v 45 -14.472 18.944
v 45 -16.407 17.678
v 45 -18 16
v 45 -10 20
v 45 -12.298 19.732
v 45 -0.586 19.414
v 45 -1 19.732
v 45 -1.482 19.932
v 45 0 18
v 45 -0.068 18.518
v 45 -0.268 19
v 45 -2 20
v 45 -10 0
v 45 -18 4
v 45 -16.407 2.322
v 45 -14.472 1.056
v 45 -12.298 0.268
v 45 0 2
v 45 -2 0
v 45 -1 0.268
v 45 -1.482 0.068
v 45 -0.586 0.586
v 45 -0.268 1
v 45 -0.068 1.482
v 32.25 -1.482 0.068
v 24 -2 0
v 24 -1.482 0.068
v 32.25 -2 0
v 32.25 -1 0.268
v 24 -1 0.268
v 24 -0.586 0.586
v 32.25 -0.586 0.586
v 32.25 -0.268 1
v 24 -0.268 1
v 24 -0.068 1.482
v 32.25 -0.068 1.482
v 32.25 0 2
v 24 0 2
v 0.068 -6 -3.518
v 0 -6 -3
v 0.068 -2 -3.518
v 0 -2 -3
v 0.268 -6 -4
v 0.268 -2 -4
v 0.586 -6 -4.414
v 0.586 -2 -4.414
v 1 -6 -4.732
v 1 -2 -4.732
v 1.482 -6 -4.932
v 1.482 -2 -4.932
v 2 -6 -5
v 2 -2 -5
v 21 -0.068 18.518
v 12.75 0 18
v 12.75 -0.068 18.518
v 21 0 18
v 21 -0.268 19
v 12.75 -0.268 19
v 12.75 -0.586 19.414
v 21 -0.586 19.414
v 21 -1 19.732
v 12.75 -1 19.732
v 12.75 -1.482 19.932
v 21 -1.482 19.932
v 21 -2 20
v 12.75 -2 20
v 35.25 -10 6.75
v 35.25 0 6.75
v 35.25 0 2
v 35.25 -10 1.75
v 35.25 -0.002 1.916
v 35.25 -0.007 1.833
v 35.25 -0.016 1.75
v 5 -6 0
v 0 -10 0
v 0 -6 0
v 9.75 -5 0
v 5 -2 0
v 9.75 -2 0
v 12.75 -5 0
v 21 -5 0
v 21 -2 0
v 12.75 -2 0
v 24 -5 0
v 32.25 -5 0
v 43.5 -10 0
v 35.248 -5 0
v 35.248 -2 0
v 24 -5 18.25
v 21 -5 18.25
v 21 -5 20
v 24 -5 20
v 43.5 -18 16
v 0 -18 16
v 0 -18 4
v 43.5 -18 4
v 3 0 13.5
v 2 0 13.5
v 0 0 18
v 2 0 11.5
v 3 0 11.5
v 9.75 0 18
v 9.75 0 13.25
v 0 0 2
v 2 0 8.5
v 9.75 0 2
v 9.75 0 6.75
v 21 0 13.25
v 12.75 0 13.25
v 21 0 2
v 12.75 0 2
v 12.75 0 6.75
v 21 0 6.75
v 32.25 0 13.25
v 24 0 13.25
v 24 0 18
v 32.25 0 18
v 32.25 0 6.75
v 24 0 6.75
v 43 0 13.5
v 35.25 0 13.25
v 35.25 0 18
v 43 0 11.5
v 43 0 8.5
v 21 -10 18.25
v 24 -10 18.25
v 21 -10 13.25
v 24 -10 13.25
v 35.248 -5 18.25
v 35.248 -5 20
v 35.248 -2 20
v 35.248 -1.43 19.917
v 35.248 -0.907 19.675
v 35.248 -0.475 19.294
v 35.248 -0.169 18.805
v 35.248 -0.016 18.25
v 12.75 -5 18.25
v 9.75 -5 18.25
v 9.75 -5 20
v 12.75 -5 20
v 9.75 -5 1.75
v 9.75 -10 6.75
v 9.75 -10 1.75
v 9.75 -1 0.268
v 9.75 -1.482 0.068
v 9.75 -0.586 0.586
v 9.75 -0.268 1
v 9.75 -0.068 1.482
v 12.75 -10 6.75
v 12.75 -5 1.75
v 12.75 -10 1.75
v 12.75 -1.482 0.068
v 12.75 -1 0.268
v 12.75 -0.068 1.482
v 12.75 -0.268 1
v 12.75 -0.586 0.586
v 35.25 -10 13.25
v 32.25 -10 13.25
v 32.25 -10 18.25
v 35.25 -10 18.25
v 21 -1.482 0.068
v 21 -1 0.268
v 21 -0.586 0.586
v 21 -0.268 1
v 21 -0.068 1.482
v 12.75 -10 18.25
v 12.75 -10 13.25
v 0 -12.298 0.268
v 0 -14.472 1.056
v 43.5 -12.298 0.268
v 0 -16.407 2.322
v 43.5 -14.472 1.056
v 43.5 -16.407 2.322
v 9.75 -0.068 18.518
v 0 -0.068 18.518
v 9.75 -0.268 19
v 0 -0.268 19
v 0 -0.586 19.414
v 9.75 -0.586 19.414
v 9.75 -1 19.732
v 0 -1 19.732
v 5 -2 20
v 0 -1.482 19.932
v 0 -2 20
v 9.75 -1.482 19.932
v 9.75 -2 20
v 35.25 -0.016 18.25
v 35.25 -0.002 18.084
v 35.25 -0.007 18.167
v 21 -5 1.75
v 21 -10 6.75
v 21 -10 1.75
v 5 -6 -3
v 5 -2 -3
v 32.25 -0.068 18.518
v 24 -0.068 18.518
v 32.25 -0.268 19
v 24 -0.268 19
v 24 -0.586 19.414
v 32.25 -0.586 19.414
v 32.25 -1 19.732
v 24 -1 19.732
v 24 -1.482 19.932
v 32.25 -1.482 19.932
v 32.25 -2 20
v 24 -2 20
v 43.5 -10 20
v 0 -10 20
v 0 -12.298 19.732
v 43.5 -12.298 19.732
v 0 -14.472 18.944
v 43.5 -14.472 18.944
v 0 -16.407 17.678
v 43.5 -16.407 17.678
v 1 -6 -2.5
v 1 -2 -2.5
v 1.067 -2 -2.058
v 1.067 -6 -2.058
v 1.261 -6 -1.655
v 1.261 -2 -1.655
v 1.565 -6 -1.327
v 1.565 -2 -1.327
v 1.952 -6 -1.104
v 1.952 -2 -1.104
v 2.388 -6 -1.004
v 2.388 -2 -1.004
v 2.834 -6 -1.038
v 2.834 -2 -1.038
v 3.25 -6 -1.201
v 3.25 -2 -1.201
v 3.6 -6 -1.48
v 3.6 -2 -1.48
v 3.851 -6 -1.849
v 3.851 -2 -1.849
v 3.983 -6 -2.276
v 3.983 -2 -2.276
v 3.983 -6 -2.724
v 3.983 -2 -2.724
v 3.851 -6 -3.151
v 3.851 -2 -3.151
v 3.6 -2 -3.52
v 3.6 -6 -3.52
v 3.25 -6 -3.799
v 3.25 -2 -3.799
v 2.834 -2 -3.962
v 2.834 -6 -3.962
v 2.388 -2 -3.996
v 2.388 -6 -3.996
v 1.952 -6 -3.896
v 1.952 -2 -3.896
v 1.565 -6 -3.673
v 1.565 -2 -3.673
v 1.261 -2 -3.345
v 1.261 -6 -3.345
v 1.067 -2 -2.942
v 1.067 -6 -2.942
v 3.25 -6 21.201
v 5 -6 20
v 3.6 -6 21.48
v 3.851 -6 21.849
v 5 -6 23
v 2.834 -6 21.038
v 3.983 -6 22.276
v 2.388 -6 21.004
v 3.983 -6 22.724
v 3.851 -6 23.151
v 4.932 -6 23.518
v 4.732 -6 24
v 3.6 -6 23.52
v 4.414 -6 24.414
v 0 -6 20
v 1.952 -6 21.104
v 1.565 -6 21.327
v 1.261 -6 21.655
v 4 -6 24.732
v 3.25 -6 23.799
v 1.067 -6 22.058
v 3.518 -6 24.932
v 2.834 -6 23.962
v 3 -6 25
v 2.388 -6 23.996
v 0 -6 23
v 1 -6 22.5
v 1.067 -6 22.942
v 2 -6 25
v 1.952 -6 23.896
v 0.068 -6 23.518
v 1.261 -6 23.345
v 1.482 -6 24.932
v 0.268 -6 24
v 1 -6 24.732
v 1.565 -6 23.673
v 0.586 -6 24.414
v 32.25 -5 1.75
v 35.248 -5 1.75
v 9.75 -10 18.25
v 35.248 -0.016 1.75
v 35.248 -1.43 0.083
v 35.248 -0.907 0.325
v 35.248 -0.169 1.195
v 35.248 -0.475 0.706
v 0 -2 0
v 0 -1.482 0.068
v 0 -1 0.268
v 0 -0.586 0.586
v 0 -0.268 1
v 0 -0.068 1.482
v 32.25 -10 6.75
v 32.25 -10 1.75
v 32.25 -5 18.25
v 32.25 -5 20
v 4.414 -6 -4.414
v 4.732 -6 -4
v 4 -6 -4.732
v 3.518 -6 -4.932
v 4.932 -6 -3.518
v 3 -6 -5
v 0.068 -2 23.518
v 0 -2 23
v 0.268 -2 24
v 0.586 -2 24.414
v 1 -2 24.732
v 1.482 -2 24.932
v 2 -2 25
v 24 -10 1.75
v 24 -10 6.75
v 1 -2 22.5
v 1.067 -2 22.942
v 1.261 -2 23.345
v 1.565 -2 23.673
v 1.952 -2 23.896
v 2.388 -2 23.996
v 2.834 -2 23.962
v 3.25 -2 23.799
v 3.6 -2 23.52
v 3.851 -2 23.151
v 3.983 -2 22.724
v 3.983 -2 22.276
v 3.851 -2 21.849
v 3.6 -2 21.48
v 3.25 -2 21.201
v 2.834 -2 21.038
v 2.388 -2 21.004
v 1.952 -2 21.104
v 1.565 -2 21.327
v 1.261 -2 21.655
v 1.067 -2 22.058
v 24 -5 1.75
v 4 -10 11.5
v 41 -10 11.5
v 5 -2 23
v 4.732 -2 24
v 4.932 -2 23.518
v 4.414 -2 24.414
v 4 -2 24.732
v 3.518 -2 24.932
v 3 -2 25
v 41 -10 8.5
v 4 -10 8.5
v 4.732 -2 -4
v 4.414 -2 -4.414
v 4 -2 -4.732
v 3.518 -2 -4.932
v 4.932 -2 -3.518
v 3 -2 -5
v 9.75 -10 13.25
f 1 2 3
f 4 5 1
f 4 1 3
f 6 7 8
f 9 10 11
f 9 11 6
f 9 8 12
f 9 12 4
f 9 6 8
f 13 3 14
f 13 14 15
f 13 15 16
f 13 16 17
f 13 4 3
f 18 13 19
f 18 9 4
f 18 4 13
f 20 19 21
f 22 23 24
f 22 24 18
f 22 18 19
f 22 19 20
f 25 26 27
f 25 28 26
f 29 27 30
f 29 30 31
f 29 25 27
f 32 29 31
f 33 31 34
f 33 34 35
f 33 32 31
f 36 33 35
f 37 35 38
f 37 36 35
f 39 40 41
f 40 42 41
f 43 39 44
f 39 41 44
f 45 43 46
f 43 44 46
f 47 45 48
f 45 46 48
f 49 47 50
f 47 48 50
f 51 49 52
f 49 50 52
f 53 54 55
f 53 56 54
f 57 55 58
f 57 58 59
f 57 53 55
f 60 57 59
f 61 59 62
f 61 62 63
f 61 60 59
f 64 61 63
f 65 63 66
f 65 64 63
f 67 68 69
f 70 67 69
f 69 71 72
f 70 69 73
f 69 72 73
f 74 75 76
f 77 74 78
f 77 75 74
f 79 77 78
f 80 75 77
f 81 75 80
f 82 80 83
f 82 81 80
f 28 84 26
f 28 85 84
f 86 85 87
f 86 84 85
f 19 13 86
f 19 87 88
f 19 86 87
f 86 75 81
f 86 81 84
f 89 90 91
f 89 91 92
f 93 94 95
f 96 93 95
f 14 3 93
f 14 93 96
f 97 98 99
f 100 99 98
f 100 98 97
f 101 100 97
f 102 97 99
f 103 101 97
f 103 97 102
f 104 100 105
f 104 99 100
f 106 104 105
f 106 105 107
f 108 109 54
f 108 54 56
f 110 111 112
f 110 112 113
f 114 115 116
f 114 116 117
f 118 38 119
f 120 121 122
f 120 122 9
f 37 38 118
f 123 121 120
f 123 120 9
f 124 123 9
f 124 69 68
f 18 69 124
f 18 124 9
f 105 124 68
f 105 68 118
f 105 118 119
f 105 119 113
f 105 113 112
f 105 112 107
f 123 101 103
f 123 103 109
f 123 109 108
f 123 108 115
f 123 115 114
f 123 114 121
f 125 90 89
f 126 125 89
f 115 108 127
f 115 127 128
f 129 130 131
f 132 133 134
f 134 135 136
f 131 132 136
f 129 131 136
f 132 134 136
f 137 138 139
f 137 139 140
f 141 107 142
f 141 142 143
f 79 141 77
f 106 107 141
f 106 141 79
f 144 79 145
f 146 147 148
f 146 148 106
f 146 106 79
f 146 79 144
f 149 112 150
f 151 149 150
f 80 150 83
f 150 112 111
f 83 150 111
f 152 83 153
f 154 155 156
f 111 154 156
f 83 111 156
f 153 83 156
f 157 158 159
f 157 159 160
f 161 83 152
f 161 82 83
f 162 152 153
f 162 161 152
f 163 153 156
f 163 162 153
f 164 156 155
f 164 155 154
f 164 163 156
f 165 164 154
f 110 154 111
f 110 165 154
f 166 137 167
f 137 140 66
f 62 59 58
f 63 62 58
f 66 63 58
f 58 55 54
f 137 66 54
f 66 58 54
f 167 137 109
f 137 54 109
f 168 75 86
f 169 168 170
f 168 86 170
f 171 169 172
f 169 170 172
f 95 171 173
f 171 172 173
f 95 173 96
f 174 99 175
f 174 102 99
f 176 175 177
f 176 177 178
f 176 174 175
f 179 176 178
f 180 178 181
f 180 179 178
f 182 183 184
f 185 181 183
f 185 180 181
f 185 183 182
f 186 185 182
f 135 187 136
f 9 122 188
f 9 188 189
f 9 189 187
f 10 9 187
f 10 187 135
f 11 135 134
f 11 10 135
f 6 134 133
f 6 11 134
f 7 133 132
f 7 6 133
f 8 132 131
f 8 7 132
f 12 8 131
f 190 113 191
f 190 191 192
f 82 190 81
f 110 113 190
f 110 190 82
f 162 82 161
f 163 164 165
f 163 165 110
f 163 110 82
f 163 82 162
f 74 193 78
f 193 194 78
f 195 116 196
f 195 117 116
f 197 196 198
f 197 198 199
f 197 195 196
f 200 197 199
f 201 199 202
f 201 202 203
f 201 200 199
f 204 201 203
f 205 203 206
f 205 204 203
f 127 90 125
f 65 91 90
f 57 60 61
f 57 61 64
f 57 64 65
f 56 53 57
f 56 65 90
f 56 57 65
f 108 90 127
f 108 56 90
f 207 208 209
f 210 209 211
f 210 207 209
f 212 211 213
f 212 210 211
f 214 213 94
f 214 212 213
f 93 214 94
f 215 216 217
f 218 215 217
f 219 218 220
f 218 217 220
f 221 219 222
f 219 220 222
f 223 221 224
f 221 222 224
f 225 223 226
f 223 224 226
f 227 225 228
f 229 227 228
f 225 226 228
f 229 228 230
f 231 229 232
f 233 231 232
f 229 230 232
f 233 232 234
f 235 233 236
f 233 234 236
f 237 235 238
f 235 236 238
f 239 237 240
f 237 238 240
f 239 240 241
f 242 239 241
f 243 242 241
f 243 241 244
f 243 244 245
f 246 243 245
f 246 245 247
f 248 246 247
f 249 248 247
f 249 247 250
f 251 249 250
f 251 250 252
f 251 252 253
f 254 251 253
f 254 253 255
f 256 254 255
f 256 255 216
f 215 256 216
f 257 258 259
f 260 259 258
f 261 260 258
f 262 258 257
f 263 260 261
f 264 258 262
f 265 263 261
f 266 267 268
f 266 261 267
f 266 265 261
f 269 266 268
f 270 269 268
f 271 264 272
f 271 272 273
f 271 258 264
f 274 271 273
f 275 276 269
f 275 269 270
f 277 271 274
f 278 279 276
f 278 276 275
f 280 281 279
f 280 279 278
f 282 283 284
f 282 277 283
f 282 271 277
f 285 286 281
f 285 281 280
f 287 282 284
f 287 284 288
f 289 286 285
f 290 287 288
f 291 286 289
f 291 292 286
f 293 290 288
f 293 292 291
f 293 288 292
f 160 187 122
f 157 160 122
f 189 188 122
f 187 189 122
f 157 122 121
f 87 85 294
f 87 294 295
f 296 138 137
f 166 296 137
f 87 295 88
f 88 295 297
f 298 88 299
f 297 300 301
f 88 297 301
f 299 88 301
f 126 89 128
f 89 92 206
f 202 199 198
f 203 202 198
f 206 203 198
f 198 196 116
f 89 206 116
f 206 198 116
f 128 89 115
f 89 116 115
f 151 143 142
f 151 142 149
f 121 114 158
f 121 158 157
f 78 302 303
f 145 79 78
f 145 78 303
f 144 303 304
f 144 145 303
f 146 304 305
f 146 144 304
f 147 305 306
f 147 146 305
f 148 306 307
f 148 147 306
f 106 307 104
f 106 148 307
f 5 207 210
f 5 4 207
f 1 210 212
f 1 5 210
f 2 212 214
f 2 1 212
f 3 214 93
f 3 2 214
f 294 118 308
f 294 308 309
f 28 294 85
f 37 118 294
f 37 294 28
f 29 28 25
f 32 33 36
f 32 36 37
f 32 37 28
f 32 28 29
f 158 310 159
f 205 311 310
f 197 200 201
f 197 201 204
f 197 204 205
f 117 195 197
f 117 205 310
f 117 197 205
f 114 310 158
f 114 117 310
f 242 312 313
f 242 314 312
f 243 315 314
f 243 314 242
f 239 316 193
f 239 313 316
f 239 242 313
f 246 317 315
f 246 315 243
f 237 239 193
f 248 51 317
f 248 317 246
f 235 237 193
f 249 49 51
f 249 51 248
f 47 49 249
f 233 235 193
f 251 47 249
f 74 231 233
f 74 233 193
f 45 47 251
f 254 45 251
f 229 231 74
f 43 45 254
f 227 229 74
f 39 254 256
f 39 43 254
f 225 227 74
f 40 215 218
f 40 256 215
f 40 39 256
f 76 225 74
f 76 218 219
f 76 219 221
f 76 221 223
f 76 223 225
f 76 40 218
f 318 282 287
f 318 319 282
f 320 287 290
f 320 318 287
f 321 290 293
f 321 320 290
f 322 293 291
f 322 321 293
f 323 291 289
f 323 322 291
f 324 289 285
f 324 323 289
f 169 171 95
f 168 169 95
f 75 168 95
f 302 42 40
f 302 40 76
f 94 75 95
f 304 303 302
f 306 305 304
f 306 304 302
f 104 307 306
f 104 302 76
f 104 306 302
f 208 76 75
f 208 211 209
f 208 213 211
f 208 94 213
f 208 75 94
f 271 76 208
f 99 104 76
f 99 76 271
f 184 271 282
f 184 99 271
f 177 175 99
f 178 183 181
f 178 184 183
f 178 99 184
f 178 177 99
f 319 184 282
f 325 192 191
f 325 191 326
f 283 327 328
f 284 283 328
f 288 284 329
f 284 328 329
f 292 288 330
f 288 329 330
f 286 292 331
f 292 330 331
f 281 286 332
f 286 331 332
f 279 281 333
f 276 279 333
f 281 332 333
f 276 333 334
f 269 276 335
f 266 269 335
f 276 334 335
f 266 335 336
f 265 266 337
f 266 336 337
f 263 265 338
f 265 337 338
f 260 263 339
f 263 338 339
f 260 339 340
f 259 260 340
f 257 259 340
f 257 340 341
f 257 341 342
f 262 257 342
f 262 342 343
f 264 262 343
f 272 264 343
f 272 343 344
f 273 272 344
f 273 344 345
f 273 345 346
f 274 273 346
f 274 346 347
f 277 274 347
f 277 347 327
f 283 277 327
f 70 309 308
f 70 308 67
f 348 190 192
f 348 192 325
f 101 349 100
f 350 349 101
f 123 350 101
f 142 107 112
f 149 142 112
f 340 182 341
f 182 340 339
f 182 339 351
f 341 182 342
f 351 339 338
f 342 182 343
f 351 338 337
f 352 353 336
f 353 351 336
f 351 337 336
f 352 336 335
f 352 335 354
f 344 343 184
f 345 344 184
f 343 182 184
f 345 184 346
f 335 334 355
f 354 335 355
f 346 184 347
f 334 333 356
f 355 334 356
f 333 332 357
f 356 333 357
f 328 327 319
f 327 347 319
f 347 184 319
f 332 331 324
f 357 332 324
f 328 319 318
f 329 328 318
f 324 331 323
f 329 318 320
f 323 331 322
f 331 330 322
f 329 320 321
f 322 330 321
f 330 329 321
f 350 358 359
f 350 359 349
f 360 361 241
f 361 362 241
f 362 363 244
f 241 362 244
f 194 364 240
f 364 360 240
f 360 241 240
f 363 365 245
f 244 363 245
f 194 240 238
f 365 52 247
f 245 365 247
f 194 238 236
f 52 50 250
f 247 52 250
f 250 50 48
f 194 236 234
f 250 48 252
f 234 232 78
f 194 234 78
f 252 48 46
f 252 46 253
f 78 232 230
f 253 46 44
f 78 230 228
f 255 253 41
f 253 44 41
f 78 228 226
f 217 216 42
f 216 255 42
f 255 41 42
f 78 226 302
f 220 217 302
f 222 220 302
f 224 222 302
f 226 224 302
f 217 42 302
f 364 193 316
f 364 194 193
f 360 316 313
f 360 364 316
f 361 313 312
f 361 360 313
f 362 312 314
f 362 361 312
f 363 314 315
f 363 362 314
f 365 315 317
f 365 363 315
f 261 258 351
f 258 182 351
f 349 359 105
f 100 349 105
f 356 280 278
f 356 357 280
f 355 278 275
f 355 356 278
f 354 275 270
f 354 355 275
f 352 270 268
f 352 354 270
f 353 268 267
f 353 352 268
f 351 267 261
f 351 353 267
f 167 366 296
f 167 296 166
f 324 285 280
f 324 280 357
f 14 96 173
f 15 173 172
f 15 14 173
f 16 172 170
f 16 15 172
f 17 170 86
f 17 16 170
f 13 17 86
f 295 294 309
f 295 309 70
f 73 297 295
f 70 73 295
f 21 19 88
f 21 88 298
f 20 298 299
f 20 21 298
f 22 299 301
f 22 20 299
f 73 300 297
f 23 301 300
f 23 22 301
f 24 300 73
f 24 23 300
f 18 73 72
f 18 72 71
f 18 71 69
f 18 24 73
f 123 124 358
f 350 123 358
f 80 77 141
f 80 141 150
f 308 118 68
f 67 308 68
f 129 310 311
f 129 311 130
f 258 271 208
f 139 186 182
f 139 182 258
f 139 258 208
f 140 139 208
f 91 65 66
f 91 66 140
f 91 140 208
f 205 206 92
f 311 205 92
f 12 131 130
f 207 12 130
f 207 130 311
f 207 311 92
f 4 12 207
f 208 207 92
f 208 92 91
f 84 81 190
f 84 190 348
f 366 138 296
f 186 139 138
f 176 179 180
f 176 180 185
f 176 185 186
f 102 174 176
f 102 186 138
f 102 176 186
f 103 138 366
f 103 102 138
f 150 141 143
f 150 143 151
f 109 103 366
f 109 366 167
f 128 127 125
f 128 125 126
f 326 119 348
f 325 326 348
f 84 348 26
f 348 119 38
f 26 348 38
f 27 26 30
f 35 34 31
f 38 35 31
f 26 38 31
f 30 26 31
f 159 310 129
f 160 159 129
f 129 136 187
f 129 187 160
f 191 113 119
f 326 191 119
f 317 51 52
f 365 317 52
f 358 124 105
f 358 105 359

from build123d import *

# Parameters (mm, degrees)
SKETCH1_W            = 90
SKETCH1_H            = 20
BOSS_EXTRUDE1_DEPTH  = 20
SKETCH2_W            = 90
SKETCH2_H            = 3
CUT_EXTRUDE1_DEPTH   = 10
SKETCH3_W            = 3
SKETCH3_H            = 5
CUT_EXTRUDE2_DEPTH   = 10
SKETCH4_W            = 3
SKETCH4_H            = 1.75
SKETCH4_W_2          = 2.997618753
SKETCH4_W_3          = 3.002941468
CUT_EXTRUDE3_DEPTH   = 5
SKETCH5_W            = 1.5
SKETCH5_H            = 3
BOSS_EXTRUDE2_DEPTH  = 10
SKETCH6_W            = 1.5
SKETCH6_H            = 3
BOSS_EXTRUDE3_DEPTH  = 18
BOSS_EXTRUDE4_DEPTH  = 5
FILLET1_START        = 8.5
FILLET1_DEPTH        = 3
FILLET1_START_2      = 8
FILLET1_2_DEPTH      = 4
FILLET2_R            = 10
SKETCH8_W            = 20.140972823
SKETCH8_H            = 2
CUT_EXTRUDE4_DEPTH   = 119
FILLET3_R            = 2
SKETCH9_W            = 5
SKETCH9_H            = 4
BOSS_EXTRUDE6_DEPTH  = 5
SKETCH11_W           = 5
SKETCH11_H           = 4
BOSS_EXTRUDE7_DEPTH  = 5
SKETCH12_R           = 1.5
CUT_EXTRUDE5_DEPTH   = 24
FILLET4_R            = 2
SKETCH14_W           = 71.95999564
SKETCH14_H           = 44.647918029
CUT_EXTRUDE8_DEPTH   = 55
BOSS_EXTRUDE8_START  = 1.5
BOSS_EXTRUDE8_DEPTH  = 1.5
SKETCH16_W           = 5.976122604
SKETCH16_H           = 3
CUT_EXTRUDE9_DEPTH   = 10
SKETCH17_W           = 2
SKETCH17_H           = 3
BOSS_EXTRUDE9_DEPTH  = 10
BOSS_EXTRUDE10_DEPTH = 5


with BuildPart() as part:
    # Sketch1 → Boss-Extrude1 (new body)
    with BuildSketch(Plane.XY):
        with Locations((45, -10)):
            Rectangle(SKETCH1_W, SKETCH1_H)
    extrude(amount=BOSS_EXTRUDE1_DEPTH)

    # Sketch2 → Cut-Extrude1 (cut)
    with BuildSketch(Plane(origin=(0, 0, 0), x_dir=(1, 0, 0), z_dir=(0, 1, 0))):
        with Locations((45, -10)):
            Rectangle(SKETCH2_W, SKETCH2_H)
    extrude(amount=-CUT_EXTRUDE1_DEPTH, mode=Mode.SUBTRACT)

    # Sketch3 → Cut-Extrude2 (cut)
    with BuildSketch(Plane(origin=(0, 0, 0), x_dir=(1, 0, 0), z_dir=(0, 1, 0))):
        with Locations((11.25, -15.75)):
            Rectangle(SKETCH3_W, SKETCH3_H)
        with Locations((22.5, -15.75)):
            Rectangle(SKETCH3_W, SKETCH3_H)
        with Locations((33.75, -15.75)):
            Rectangle(SKETCH3_W, SKETCH3_H)
        with Locations((45, -15.75)):
            Rectangle(SKETCH3_W, SKETCH3_H)
        with Locations((56.25, -15.75)):
            Rectangle(SKETCH3_W, SKETCH3_H)
        with Locations((67.5, -15.75)):
            Rectangle(SKETCH3_W, SKETCH3_H)
        with Locations((78.75, -15.75)):
            Rectangle(SKETCH3_W, SKETCH3_H)
        with Locations((11.25, -4.25)):
            Rectangle(SKETCH3_W, SKETCH3_H)
        with Locations((22.5, -4.25)):
            Rectangle(SKETCH3_W, SKETCH3_H)
        with Locations((33.75, -4.25)):
            Rectangle(SKETCH3_W, SKETCH3_H)
        with Locations((45, -4.25)):
            Rectangle(SKETCH3_W, SKETCH3_H)
        with Locations((56.25, -4.25)):
            Rectangle(SKETCH3_W, SKETCH3_H)
        with Locations((67.5, -4.25)):
            Rectangle(SKETCH3_W, SKETCH3_H)
        with Locations((78.75, -4.25)):
            Rectangle(SKETCH3_W, SKETCH3_H)
    extrude(amount=-CUT_EXTRUDE2_DEPTH, mode=Mode.SUBTRACT)

    # Sketch4 → Cut-Extrude3 (cut)
    with BuildSketch(Plane(origin=(0, 0, 0), x_dir=(1, 0, 0), z_dir=(0, 1, 0))):
        with Locations((56.25, -19.125)):
            Rectangle(SKETCH4_W, SKETCH4_H)
        with Locations((67.5, -19.125)):
            Rectangle(SKETCH4_W, SKETCH4_H)
        Polygon((77.25, -18.25), (77.25, -20), (80.252941468, -20), (80.252941468, -18.25), (80.25, -18.25), align=None)
        with Locations((45, -19.125)):
            Rectangle(SKETCH4_W, SKETCH4_H)
        with Locations((33.748809377, -19.125)):
            Rectangle(SKETCH4_W_2, SKETCH4_H)
        with Locations((22.5, -19.125)):
            Rectangle(SKETCH4_W, SKETCH4_H)
        with Locations((11.25, -19.125)):
            Rectangle(SKETCH4_W, SKETCH4_H)
        with Locations((22.5, -0.875)):
            Rectangle(SKETCH4_W, SKETCH4_H)
        with Locations((33.748809377, -0.875)):
            Rectangle(SKETCH4_W_2, SKETCH4_H)
        with Locations((45, -0.875)):
            Rectangle(SKETCH4_W, SKETCH4_H)
        with Locations((56.25, -0.875)):
            Rectangle(SKETCH4_W, SKETCH4_H)
        with Locations((67.5, -0.875)):
            Rectangle(SKETCH4_W, SKETCH4_H)
        with Locations((78.751470734, -0.875)):
            Rectangle(SKETCH4_W_3, SKETCH4_H)
        with Locations((11.25, -0.875)):
            Rectangle(SKETCH4_W, SKETCH4_H)
    extrude(amount=-CUT_EXTRUDE3_DEPTH, mode=Mode.SUBTRACT)

    # Sketch5 → Boss-Extrude2 (add)
    with BuildSketch(Plane(origin=(0, -10, 0), x_dir=(1, 0, 0), z_dir=(0, 1, 0))):
        with Locations((0.75, -10)):
            Rectangle(SKETCH5_W, SKETCH5_H)
        with Locations((89.25, -10)):
            Rectangle(SKETCH5_W, SKETCH5_H)
    extrude(amount=BOSS_EXTRUDE2_DEPTH)

    # Sketch6 → Boss-Extrude3 (add)
    with BuildSketch(Plane(origin=(0, 0, 0), x_dir=(1, 0, 0), z_dir=(0, 1, 0))):
        with Locations((2.25, -10)):
            Rectangle(SKETCH6_W, SKETCH6_H)
        with Locations((87.75, -10)):
            Rectangle(SKETCH6_W, SKETCH6_H)
    extrude(amount=-BOSS_EXTRUDE3_DEPTH)

    # Sketch7 → Boss-Extrude4 (add)
    with BuildSketch(Plane.XY.offset(8.5)):
        Polygon((3, -9.907661673), (3, -10), (6, -10), (3, 0), align=None)
        Polygon((87, 0), (84, -10), (87, -10), align=None)
    extrude(amount=BOSS_EXTRUDE4_DEPTH)

    # Fillet1: read off the stored shape, not the designer's step
    # Fillet1 outline → Fillet1 (cut)
    with BuildSketch(Plane.XY.offset(FILLET1_START)):
        with BuildLine():
            ThreePointArc((1.511938698, 0), (2.705799758, -0.395414143), (3.427591269, -1.425304229))
            Line((3.427591269, -1.425304229), (3, 0))
            Line((3, 0), (1.511938698, 0))
        make_face()
        with BuildLine():
            Line((87, 0), (86.572408731, -1.425304229))
            ThreePointArc((86.572408731, -1.425304229), (87.294200242, -0.395414143), (88.488061302, 0))
            Line((88.488061302, 0), (87, 0))
        make_face()
    extrude(amount=FILLET1_DEPTH, mode=Mode.SUBTRACT)

    # Fillet1 2 outline → Fillet1 2 (add)
    with BuildSketch(Plane.XY.offset(FILLET1_START_2)):
        with BuildLine():
            Line((6, -10), (7.488061302, -10))
            ThreePointArc((7.488061302, -10), (6.294200242, -9.604585857), (5.572408731, -8.574695771))
            Line((5.572408731, -8.574695771), (6, -10))
        make_face()
        with BuildLine():
            ThreePointArc((84.427591269, -8.574695771), (83.705799758, -9.604585857), (82.511938698, -10))
            Line((82.511938698, -10), (84, -10))
            Line((84, -10), (84.427591269, -8.574695771))
        make_face()
    extrude(amount=FILLET1_2_DEPTH)

    # Fillet2
    fillet2_edges = [part.edges().sort_by_distance(p)[0] for p in [
        (45, -20, 0),
        (45, -20, 20),
    ]]
    fillet(fillet2_edges, radius=FILLET2_R - 0.0001)  # a hair under: the kernel refuses the full size

    # Sketch8 → Cut-Extrude4 (cut)
    with BuildSketch(Plane.ZY):
        with Locations((10.770725067, -19)):
            Rectangle(SKETCH8_W, SKETCH8_H)
    extrude(amount=-CUT_EXTRUDE4_DEPTH, mode=Mode.SUBTRACT)

    # Fillet3
    fillet3_edges = [part.edges().sort_by_distance(p)[0] for p in [
        (4.875, 0, 0),
        (4.875, 0, 20),
        (16.875, 0, 20),
        (16.875, 0, 0),
        (28.125, 0, 0),
        (28.125, 0, 20),
        (39.373809377, 0, 20),
        (39.373809377, 0, 0),
        (50.625, 0, 0),
        (50.625, 0, 20),
        (61.875, 0, 20),
        (61.875, 0, 0),
        (73.125, 0, 0),
        (73.125, 0, 20),
        (85.126470734, 0, 20),
        (85.126470734, 0, 0),
    ]]
    fillet(fillet3_edges, radius=FILLET3_R)

    # Sketch9 → Boss-Extrude6 (add)
    with BuildSketch(Plane.ZY):
        with Locations((-2.5, -4)):
            Rectangle(SKETCH9_W, SKETCH9_H)
        with Locations((22.5, -4)):
            Rectangle(SKETCH9_W, SKETCH9_H)
    extrude(amount=-BOSS_EXTRUDE6_DEPTH)

    # Sketch11 → Boss-Extrude7 (add)
    with BuildSketch(Plane(origin=(90, 0, 0), x_dir=(0, 0, -1), z_dir=(1, 0, 0))):
        with Locations((2.5, -4)):
            Rectangle(SKETCH11_W, SKETCH11_H)
        with Locations((-22.5, -4)):
            Rectangle(SKETCH11_W, SKETCH11_H)
    extrude(amount=-BOSS_EXTRUDE7_DEPTH)

    # Sketch12 → Cut-Extrude5 (cut)
    with BuildSketch(Plane(origin=(0, -2, 0), x_dir=(1, 0, 0), z_dir=(0, 1, 0))):
        with Locations(Location((2.5, 2.5, 0), (0, 0, 180))):
            Circle(SKETCH12_R)
        with Locations(Location((87.5, 2.5, 0), (0, 0, 180))):
            Circle(SKETCH12_R)
        with Locations(Location((87.5, -22.5, 0), (0, 0, 180))):
            Circle(SKETCH12_R)
        with Locations(Location((2.5, -22.5, 0), (0, 0, 180))):
            Circle(SKETCH12_R)
    extrude(amount=-CUT_EXTRUDE5_DEPTH, mode=Mode.SUBTRACT)

    # Fillet4
    fillet4_edges = [part.edges().sort_by_distance(p)[0] for p in [
        (0, -4, -5),
        (5, -4, -5),
        (5, -4, 25),
        (0, -4, 25),
        (85, -4, -5),
        (90, -4, -5),
        (85, -4, 25),
        (90, -4, 25),
    ]]
    fillet(fillet4_edges, radius=FILLET4_R)

    # Sketch14 → Cut-Extrude8 (cut)
    with BuildSketch(Plane(origin=(0, 0, 0), x_dir=(1, 0, 0), z_dir=(0, 1, 0))):
        with Locations((79.47999782, -11.65925291)):
            Rectangle(SKETCH14_W, SKETCH14_H)
    extrude(amount=-CUT_EXTRUDE8_DEPTH, mode=Mode.SUBTRACT)

    # Sketch15 → Boss-Extrude8 (add)
    with BuildSketch(Plane(origin=(43.5, 0, 0), x_dir=(0, 0, -1), z_dir=(1, 0, 0)).offset(BOSS_EXTRUDE8_START)):
        with BuildLine():
            Line((-11.5, 0), (-18, 0))
            ThreePointArc((-18, 0), (-19.414213562, -0.585786438), (-20, -2))
            Line((-20, -2), (-20, -10))
            ThreePointArc((-20, -10), (-18.94427191, -14.472135955), (-16, -18))
            Line((-16, -18), (-4, -18))
            ThreePointArc((-4, -18), (-1.05572809, -14.472135955), (0, -10))
            Line((0, -10), (0, -2))
            ThreePointArc((0, -2), (-0.585786438, -0.585786438), (-2, 0))
            Line((-2, 0), (-4, 0))
            Line((-4, 0), (-8.5, 0))
            Line((-8.5, 0), (-8.5, -10))
            Line((-8.5, -10), (-11.5, -10))
            Line((-11.5, -10), (-11.5, 0))
        make_face()
    extrude(amount=-BOSS_EXTRUDE8_DEPTH)

    # Sketch16 → Cut-Extrude9 (cut)
    with BuildSketch(Plane(origin=(0, 0, 0), x_dir=(1, 0, 0), z_dir=(0, 1, 0))):
        with Locations((4.5, -10)):
            Rectangle(SKETCH16_W, SKETCH16_H)
    extrude(amount=-CUT_EXTRUDE9_DEPTH, mode=Mode.SUBTRACT)

    # Sketch17 → Boss-Extrude9 (add)
    with BuildSketch(Plane(origin=(0, 0, 0), x_dir=(1, 0, 0), z_dir=(0, 1, 0))):
        Polygon((2, -8.5), (1.511938698, -8.5), (0, -8.5), (0, -11.5), (1.511938698, -11.5), (2, -11.5), align=None)
        with Locations((44, -10)):
            Rectangle(SKETCH17_W, SKETCH17_H)
    extrude(amount=-BOSS_EXTRUDE9_DEPTH)

    # Sketch18 → Boss-Extrude10 (add)
    with BuildSketch(Plane.XY.offset(8.5)):
        Polygon((4, -10), (2, 0), (2, -10), align=None)
        Polygon((43, 0), (41, -10), (43, -10), align=None)
    extrude(amount=BOSS_EXTRUDE10_DEPTH)


solid = part.part
